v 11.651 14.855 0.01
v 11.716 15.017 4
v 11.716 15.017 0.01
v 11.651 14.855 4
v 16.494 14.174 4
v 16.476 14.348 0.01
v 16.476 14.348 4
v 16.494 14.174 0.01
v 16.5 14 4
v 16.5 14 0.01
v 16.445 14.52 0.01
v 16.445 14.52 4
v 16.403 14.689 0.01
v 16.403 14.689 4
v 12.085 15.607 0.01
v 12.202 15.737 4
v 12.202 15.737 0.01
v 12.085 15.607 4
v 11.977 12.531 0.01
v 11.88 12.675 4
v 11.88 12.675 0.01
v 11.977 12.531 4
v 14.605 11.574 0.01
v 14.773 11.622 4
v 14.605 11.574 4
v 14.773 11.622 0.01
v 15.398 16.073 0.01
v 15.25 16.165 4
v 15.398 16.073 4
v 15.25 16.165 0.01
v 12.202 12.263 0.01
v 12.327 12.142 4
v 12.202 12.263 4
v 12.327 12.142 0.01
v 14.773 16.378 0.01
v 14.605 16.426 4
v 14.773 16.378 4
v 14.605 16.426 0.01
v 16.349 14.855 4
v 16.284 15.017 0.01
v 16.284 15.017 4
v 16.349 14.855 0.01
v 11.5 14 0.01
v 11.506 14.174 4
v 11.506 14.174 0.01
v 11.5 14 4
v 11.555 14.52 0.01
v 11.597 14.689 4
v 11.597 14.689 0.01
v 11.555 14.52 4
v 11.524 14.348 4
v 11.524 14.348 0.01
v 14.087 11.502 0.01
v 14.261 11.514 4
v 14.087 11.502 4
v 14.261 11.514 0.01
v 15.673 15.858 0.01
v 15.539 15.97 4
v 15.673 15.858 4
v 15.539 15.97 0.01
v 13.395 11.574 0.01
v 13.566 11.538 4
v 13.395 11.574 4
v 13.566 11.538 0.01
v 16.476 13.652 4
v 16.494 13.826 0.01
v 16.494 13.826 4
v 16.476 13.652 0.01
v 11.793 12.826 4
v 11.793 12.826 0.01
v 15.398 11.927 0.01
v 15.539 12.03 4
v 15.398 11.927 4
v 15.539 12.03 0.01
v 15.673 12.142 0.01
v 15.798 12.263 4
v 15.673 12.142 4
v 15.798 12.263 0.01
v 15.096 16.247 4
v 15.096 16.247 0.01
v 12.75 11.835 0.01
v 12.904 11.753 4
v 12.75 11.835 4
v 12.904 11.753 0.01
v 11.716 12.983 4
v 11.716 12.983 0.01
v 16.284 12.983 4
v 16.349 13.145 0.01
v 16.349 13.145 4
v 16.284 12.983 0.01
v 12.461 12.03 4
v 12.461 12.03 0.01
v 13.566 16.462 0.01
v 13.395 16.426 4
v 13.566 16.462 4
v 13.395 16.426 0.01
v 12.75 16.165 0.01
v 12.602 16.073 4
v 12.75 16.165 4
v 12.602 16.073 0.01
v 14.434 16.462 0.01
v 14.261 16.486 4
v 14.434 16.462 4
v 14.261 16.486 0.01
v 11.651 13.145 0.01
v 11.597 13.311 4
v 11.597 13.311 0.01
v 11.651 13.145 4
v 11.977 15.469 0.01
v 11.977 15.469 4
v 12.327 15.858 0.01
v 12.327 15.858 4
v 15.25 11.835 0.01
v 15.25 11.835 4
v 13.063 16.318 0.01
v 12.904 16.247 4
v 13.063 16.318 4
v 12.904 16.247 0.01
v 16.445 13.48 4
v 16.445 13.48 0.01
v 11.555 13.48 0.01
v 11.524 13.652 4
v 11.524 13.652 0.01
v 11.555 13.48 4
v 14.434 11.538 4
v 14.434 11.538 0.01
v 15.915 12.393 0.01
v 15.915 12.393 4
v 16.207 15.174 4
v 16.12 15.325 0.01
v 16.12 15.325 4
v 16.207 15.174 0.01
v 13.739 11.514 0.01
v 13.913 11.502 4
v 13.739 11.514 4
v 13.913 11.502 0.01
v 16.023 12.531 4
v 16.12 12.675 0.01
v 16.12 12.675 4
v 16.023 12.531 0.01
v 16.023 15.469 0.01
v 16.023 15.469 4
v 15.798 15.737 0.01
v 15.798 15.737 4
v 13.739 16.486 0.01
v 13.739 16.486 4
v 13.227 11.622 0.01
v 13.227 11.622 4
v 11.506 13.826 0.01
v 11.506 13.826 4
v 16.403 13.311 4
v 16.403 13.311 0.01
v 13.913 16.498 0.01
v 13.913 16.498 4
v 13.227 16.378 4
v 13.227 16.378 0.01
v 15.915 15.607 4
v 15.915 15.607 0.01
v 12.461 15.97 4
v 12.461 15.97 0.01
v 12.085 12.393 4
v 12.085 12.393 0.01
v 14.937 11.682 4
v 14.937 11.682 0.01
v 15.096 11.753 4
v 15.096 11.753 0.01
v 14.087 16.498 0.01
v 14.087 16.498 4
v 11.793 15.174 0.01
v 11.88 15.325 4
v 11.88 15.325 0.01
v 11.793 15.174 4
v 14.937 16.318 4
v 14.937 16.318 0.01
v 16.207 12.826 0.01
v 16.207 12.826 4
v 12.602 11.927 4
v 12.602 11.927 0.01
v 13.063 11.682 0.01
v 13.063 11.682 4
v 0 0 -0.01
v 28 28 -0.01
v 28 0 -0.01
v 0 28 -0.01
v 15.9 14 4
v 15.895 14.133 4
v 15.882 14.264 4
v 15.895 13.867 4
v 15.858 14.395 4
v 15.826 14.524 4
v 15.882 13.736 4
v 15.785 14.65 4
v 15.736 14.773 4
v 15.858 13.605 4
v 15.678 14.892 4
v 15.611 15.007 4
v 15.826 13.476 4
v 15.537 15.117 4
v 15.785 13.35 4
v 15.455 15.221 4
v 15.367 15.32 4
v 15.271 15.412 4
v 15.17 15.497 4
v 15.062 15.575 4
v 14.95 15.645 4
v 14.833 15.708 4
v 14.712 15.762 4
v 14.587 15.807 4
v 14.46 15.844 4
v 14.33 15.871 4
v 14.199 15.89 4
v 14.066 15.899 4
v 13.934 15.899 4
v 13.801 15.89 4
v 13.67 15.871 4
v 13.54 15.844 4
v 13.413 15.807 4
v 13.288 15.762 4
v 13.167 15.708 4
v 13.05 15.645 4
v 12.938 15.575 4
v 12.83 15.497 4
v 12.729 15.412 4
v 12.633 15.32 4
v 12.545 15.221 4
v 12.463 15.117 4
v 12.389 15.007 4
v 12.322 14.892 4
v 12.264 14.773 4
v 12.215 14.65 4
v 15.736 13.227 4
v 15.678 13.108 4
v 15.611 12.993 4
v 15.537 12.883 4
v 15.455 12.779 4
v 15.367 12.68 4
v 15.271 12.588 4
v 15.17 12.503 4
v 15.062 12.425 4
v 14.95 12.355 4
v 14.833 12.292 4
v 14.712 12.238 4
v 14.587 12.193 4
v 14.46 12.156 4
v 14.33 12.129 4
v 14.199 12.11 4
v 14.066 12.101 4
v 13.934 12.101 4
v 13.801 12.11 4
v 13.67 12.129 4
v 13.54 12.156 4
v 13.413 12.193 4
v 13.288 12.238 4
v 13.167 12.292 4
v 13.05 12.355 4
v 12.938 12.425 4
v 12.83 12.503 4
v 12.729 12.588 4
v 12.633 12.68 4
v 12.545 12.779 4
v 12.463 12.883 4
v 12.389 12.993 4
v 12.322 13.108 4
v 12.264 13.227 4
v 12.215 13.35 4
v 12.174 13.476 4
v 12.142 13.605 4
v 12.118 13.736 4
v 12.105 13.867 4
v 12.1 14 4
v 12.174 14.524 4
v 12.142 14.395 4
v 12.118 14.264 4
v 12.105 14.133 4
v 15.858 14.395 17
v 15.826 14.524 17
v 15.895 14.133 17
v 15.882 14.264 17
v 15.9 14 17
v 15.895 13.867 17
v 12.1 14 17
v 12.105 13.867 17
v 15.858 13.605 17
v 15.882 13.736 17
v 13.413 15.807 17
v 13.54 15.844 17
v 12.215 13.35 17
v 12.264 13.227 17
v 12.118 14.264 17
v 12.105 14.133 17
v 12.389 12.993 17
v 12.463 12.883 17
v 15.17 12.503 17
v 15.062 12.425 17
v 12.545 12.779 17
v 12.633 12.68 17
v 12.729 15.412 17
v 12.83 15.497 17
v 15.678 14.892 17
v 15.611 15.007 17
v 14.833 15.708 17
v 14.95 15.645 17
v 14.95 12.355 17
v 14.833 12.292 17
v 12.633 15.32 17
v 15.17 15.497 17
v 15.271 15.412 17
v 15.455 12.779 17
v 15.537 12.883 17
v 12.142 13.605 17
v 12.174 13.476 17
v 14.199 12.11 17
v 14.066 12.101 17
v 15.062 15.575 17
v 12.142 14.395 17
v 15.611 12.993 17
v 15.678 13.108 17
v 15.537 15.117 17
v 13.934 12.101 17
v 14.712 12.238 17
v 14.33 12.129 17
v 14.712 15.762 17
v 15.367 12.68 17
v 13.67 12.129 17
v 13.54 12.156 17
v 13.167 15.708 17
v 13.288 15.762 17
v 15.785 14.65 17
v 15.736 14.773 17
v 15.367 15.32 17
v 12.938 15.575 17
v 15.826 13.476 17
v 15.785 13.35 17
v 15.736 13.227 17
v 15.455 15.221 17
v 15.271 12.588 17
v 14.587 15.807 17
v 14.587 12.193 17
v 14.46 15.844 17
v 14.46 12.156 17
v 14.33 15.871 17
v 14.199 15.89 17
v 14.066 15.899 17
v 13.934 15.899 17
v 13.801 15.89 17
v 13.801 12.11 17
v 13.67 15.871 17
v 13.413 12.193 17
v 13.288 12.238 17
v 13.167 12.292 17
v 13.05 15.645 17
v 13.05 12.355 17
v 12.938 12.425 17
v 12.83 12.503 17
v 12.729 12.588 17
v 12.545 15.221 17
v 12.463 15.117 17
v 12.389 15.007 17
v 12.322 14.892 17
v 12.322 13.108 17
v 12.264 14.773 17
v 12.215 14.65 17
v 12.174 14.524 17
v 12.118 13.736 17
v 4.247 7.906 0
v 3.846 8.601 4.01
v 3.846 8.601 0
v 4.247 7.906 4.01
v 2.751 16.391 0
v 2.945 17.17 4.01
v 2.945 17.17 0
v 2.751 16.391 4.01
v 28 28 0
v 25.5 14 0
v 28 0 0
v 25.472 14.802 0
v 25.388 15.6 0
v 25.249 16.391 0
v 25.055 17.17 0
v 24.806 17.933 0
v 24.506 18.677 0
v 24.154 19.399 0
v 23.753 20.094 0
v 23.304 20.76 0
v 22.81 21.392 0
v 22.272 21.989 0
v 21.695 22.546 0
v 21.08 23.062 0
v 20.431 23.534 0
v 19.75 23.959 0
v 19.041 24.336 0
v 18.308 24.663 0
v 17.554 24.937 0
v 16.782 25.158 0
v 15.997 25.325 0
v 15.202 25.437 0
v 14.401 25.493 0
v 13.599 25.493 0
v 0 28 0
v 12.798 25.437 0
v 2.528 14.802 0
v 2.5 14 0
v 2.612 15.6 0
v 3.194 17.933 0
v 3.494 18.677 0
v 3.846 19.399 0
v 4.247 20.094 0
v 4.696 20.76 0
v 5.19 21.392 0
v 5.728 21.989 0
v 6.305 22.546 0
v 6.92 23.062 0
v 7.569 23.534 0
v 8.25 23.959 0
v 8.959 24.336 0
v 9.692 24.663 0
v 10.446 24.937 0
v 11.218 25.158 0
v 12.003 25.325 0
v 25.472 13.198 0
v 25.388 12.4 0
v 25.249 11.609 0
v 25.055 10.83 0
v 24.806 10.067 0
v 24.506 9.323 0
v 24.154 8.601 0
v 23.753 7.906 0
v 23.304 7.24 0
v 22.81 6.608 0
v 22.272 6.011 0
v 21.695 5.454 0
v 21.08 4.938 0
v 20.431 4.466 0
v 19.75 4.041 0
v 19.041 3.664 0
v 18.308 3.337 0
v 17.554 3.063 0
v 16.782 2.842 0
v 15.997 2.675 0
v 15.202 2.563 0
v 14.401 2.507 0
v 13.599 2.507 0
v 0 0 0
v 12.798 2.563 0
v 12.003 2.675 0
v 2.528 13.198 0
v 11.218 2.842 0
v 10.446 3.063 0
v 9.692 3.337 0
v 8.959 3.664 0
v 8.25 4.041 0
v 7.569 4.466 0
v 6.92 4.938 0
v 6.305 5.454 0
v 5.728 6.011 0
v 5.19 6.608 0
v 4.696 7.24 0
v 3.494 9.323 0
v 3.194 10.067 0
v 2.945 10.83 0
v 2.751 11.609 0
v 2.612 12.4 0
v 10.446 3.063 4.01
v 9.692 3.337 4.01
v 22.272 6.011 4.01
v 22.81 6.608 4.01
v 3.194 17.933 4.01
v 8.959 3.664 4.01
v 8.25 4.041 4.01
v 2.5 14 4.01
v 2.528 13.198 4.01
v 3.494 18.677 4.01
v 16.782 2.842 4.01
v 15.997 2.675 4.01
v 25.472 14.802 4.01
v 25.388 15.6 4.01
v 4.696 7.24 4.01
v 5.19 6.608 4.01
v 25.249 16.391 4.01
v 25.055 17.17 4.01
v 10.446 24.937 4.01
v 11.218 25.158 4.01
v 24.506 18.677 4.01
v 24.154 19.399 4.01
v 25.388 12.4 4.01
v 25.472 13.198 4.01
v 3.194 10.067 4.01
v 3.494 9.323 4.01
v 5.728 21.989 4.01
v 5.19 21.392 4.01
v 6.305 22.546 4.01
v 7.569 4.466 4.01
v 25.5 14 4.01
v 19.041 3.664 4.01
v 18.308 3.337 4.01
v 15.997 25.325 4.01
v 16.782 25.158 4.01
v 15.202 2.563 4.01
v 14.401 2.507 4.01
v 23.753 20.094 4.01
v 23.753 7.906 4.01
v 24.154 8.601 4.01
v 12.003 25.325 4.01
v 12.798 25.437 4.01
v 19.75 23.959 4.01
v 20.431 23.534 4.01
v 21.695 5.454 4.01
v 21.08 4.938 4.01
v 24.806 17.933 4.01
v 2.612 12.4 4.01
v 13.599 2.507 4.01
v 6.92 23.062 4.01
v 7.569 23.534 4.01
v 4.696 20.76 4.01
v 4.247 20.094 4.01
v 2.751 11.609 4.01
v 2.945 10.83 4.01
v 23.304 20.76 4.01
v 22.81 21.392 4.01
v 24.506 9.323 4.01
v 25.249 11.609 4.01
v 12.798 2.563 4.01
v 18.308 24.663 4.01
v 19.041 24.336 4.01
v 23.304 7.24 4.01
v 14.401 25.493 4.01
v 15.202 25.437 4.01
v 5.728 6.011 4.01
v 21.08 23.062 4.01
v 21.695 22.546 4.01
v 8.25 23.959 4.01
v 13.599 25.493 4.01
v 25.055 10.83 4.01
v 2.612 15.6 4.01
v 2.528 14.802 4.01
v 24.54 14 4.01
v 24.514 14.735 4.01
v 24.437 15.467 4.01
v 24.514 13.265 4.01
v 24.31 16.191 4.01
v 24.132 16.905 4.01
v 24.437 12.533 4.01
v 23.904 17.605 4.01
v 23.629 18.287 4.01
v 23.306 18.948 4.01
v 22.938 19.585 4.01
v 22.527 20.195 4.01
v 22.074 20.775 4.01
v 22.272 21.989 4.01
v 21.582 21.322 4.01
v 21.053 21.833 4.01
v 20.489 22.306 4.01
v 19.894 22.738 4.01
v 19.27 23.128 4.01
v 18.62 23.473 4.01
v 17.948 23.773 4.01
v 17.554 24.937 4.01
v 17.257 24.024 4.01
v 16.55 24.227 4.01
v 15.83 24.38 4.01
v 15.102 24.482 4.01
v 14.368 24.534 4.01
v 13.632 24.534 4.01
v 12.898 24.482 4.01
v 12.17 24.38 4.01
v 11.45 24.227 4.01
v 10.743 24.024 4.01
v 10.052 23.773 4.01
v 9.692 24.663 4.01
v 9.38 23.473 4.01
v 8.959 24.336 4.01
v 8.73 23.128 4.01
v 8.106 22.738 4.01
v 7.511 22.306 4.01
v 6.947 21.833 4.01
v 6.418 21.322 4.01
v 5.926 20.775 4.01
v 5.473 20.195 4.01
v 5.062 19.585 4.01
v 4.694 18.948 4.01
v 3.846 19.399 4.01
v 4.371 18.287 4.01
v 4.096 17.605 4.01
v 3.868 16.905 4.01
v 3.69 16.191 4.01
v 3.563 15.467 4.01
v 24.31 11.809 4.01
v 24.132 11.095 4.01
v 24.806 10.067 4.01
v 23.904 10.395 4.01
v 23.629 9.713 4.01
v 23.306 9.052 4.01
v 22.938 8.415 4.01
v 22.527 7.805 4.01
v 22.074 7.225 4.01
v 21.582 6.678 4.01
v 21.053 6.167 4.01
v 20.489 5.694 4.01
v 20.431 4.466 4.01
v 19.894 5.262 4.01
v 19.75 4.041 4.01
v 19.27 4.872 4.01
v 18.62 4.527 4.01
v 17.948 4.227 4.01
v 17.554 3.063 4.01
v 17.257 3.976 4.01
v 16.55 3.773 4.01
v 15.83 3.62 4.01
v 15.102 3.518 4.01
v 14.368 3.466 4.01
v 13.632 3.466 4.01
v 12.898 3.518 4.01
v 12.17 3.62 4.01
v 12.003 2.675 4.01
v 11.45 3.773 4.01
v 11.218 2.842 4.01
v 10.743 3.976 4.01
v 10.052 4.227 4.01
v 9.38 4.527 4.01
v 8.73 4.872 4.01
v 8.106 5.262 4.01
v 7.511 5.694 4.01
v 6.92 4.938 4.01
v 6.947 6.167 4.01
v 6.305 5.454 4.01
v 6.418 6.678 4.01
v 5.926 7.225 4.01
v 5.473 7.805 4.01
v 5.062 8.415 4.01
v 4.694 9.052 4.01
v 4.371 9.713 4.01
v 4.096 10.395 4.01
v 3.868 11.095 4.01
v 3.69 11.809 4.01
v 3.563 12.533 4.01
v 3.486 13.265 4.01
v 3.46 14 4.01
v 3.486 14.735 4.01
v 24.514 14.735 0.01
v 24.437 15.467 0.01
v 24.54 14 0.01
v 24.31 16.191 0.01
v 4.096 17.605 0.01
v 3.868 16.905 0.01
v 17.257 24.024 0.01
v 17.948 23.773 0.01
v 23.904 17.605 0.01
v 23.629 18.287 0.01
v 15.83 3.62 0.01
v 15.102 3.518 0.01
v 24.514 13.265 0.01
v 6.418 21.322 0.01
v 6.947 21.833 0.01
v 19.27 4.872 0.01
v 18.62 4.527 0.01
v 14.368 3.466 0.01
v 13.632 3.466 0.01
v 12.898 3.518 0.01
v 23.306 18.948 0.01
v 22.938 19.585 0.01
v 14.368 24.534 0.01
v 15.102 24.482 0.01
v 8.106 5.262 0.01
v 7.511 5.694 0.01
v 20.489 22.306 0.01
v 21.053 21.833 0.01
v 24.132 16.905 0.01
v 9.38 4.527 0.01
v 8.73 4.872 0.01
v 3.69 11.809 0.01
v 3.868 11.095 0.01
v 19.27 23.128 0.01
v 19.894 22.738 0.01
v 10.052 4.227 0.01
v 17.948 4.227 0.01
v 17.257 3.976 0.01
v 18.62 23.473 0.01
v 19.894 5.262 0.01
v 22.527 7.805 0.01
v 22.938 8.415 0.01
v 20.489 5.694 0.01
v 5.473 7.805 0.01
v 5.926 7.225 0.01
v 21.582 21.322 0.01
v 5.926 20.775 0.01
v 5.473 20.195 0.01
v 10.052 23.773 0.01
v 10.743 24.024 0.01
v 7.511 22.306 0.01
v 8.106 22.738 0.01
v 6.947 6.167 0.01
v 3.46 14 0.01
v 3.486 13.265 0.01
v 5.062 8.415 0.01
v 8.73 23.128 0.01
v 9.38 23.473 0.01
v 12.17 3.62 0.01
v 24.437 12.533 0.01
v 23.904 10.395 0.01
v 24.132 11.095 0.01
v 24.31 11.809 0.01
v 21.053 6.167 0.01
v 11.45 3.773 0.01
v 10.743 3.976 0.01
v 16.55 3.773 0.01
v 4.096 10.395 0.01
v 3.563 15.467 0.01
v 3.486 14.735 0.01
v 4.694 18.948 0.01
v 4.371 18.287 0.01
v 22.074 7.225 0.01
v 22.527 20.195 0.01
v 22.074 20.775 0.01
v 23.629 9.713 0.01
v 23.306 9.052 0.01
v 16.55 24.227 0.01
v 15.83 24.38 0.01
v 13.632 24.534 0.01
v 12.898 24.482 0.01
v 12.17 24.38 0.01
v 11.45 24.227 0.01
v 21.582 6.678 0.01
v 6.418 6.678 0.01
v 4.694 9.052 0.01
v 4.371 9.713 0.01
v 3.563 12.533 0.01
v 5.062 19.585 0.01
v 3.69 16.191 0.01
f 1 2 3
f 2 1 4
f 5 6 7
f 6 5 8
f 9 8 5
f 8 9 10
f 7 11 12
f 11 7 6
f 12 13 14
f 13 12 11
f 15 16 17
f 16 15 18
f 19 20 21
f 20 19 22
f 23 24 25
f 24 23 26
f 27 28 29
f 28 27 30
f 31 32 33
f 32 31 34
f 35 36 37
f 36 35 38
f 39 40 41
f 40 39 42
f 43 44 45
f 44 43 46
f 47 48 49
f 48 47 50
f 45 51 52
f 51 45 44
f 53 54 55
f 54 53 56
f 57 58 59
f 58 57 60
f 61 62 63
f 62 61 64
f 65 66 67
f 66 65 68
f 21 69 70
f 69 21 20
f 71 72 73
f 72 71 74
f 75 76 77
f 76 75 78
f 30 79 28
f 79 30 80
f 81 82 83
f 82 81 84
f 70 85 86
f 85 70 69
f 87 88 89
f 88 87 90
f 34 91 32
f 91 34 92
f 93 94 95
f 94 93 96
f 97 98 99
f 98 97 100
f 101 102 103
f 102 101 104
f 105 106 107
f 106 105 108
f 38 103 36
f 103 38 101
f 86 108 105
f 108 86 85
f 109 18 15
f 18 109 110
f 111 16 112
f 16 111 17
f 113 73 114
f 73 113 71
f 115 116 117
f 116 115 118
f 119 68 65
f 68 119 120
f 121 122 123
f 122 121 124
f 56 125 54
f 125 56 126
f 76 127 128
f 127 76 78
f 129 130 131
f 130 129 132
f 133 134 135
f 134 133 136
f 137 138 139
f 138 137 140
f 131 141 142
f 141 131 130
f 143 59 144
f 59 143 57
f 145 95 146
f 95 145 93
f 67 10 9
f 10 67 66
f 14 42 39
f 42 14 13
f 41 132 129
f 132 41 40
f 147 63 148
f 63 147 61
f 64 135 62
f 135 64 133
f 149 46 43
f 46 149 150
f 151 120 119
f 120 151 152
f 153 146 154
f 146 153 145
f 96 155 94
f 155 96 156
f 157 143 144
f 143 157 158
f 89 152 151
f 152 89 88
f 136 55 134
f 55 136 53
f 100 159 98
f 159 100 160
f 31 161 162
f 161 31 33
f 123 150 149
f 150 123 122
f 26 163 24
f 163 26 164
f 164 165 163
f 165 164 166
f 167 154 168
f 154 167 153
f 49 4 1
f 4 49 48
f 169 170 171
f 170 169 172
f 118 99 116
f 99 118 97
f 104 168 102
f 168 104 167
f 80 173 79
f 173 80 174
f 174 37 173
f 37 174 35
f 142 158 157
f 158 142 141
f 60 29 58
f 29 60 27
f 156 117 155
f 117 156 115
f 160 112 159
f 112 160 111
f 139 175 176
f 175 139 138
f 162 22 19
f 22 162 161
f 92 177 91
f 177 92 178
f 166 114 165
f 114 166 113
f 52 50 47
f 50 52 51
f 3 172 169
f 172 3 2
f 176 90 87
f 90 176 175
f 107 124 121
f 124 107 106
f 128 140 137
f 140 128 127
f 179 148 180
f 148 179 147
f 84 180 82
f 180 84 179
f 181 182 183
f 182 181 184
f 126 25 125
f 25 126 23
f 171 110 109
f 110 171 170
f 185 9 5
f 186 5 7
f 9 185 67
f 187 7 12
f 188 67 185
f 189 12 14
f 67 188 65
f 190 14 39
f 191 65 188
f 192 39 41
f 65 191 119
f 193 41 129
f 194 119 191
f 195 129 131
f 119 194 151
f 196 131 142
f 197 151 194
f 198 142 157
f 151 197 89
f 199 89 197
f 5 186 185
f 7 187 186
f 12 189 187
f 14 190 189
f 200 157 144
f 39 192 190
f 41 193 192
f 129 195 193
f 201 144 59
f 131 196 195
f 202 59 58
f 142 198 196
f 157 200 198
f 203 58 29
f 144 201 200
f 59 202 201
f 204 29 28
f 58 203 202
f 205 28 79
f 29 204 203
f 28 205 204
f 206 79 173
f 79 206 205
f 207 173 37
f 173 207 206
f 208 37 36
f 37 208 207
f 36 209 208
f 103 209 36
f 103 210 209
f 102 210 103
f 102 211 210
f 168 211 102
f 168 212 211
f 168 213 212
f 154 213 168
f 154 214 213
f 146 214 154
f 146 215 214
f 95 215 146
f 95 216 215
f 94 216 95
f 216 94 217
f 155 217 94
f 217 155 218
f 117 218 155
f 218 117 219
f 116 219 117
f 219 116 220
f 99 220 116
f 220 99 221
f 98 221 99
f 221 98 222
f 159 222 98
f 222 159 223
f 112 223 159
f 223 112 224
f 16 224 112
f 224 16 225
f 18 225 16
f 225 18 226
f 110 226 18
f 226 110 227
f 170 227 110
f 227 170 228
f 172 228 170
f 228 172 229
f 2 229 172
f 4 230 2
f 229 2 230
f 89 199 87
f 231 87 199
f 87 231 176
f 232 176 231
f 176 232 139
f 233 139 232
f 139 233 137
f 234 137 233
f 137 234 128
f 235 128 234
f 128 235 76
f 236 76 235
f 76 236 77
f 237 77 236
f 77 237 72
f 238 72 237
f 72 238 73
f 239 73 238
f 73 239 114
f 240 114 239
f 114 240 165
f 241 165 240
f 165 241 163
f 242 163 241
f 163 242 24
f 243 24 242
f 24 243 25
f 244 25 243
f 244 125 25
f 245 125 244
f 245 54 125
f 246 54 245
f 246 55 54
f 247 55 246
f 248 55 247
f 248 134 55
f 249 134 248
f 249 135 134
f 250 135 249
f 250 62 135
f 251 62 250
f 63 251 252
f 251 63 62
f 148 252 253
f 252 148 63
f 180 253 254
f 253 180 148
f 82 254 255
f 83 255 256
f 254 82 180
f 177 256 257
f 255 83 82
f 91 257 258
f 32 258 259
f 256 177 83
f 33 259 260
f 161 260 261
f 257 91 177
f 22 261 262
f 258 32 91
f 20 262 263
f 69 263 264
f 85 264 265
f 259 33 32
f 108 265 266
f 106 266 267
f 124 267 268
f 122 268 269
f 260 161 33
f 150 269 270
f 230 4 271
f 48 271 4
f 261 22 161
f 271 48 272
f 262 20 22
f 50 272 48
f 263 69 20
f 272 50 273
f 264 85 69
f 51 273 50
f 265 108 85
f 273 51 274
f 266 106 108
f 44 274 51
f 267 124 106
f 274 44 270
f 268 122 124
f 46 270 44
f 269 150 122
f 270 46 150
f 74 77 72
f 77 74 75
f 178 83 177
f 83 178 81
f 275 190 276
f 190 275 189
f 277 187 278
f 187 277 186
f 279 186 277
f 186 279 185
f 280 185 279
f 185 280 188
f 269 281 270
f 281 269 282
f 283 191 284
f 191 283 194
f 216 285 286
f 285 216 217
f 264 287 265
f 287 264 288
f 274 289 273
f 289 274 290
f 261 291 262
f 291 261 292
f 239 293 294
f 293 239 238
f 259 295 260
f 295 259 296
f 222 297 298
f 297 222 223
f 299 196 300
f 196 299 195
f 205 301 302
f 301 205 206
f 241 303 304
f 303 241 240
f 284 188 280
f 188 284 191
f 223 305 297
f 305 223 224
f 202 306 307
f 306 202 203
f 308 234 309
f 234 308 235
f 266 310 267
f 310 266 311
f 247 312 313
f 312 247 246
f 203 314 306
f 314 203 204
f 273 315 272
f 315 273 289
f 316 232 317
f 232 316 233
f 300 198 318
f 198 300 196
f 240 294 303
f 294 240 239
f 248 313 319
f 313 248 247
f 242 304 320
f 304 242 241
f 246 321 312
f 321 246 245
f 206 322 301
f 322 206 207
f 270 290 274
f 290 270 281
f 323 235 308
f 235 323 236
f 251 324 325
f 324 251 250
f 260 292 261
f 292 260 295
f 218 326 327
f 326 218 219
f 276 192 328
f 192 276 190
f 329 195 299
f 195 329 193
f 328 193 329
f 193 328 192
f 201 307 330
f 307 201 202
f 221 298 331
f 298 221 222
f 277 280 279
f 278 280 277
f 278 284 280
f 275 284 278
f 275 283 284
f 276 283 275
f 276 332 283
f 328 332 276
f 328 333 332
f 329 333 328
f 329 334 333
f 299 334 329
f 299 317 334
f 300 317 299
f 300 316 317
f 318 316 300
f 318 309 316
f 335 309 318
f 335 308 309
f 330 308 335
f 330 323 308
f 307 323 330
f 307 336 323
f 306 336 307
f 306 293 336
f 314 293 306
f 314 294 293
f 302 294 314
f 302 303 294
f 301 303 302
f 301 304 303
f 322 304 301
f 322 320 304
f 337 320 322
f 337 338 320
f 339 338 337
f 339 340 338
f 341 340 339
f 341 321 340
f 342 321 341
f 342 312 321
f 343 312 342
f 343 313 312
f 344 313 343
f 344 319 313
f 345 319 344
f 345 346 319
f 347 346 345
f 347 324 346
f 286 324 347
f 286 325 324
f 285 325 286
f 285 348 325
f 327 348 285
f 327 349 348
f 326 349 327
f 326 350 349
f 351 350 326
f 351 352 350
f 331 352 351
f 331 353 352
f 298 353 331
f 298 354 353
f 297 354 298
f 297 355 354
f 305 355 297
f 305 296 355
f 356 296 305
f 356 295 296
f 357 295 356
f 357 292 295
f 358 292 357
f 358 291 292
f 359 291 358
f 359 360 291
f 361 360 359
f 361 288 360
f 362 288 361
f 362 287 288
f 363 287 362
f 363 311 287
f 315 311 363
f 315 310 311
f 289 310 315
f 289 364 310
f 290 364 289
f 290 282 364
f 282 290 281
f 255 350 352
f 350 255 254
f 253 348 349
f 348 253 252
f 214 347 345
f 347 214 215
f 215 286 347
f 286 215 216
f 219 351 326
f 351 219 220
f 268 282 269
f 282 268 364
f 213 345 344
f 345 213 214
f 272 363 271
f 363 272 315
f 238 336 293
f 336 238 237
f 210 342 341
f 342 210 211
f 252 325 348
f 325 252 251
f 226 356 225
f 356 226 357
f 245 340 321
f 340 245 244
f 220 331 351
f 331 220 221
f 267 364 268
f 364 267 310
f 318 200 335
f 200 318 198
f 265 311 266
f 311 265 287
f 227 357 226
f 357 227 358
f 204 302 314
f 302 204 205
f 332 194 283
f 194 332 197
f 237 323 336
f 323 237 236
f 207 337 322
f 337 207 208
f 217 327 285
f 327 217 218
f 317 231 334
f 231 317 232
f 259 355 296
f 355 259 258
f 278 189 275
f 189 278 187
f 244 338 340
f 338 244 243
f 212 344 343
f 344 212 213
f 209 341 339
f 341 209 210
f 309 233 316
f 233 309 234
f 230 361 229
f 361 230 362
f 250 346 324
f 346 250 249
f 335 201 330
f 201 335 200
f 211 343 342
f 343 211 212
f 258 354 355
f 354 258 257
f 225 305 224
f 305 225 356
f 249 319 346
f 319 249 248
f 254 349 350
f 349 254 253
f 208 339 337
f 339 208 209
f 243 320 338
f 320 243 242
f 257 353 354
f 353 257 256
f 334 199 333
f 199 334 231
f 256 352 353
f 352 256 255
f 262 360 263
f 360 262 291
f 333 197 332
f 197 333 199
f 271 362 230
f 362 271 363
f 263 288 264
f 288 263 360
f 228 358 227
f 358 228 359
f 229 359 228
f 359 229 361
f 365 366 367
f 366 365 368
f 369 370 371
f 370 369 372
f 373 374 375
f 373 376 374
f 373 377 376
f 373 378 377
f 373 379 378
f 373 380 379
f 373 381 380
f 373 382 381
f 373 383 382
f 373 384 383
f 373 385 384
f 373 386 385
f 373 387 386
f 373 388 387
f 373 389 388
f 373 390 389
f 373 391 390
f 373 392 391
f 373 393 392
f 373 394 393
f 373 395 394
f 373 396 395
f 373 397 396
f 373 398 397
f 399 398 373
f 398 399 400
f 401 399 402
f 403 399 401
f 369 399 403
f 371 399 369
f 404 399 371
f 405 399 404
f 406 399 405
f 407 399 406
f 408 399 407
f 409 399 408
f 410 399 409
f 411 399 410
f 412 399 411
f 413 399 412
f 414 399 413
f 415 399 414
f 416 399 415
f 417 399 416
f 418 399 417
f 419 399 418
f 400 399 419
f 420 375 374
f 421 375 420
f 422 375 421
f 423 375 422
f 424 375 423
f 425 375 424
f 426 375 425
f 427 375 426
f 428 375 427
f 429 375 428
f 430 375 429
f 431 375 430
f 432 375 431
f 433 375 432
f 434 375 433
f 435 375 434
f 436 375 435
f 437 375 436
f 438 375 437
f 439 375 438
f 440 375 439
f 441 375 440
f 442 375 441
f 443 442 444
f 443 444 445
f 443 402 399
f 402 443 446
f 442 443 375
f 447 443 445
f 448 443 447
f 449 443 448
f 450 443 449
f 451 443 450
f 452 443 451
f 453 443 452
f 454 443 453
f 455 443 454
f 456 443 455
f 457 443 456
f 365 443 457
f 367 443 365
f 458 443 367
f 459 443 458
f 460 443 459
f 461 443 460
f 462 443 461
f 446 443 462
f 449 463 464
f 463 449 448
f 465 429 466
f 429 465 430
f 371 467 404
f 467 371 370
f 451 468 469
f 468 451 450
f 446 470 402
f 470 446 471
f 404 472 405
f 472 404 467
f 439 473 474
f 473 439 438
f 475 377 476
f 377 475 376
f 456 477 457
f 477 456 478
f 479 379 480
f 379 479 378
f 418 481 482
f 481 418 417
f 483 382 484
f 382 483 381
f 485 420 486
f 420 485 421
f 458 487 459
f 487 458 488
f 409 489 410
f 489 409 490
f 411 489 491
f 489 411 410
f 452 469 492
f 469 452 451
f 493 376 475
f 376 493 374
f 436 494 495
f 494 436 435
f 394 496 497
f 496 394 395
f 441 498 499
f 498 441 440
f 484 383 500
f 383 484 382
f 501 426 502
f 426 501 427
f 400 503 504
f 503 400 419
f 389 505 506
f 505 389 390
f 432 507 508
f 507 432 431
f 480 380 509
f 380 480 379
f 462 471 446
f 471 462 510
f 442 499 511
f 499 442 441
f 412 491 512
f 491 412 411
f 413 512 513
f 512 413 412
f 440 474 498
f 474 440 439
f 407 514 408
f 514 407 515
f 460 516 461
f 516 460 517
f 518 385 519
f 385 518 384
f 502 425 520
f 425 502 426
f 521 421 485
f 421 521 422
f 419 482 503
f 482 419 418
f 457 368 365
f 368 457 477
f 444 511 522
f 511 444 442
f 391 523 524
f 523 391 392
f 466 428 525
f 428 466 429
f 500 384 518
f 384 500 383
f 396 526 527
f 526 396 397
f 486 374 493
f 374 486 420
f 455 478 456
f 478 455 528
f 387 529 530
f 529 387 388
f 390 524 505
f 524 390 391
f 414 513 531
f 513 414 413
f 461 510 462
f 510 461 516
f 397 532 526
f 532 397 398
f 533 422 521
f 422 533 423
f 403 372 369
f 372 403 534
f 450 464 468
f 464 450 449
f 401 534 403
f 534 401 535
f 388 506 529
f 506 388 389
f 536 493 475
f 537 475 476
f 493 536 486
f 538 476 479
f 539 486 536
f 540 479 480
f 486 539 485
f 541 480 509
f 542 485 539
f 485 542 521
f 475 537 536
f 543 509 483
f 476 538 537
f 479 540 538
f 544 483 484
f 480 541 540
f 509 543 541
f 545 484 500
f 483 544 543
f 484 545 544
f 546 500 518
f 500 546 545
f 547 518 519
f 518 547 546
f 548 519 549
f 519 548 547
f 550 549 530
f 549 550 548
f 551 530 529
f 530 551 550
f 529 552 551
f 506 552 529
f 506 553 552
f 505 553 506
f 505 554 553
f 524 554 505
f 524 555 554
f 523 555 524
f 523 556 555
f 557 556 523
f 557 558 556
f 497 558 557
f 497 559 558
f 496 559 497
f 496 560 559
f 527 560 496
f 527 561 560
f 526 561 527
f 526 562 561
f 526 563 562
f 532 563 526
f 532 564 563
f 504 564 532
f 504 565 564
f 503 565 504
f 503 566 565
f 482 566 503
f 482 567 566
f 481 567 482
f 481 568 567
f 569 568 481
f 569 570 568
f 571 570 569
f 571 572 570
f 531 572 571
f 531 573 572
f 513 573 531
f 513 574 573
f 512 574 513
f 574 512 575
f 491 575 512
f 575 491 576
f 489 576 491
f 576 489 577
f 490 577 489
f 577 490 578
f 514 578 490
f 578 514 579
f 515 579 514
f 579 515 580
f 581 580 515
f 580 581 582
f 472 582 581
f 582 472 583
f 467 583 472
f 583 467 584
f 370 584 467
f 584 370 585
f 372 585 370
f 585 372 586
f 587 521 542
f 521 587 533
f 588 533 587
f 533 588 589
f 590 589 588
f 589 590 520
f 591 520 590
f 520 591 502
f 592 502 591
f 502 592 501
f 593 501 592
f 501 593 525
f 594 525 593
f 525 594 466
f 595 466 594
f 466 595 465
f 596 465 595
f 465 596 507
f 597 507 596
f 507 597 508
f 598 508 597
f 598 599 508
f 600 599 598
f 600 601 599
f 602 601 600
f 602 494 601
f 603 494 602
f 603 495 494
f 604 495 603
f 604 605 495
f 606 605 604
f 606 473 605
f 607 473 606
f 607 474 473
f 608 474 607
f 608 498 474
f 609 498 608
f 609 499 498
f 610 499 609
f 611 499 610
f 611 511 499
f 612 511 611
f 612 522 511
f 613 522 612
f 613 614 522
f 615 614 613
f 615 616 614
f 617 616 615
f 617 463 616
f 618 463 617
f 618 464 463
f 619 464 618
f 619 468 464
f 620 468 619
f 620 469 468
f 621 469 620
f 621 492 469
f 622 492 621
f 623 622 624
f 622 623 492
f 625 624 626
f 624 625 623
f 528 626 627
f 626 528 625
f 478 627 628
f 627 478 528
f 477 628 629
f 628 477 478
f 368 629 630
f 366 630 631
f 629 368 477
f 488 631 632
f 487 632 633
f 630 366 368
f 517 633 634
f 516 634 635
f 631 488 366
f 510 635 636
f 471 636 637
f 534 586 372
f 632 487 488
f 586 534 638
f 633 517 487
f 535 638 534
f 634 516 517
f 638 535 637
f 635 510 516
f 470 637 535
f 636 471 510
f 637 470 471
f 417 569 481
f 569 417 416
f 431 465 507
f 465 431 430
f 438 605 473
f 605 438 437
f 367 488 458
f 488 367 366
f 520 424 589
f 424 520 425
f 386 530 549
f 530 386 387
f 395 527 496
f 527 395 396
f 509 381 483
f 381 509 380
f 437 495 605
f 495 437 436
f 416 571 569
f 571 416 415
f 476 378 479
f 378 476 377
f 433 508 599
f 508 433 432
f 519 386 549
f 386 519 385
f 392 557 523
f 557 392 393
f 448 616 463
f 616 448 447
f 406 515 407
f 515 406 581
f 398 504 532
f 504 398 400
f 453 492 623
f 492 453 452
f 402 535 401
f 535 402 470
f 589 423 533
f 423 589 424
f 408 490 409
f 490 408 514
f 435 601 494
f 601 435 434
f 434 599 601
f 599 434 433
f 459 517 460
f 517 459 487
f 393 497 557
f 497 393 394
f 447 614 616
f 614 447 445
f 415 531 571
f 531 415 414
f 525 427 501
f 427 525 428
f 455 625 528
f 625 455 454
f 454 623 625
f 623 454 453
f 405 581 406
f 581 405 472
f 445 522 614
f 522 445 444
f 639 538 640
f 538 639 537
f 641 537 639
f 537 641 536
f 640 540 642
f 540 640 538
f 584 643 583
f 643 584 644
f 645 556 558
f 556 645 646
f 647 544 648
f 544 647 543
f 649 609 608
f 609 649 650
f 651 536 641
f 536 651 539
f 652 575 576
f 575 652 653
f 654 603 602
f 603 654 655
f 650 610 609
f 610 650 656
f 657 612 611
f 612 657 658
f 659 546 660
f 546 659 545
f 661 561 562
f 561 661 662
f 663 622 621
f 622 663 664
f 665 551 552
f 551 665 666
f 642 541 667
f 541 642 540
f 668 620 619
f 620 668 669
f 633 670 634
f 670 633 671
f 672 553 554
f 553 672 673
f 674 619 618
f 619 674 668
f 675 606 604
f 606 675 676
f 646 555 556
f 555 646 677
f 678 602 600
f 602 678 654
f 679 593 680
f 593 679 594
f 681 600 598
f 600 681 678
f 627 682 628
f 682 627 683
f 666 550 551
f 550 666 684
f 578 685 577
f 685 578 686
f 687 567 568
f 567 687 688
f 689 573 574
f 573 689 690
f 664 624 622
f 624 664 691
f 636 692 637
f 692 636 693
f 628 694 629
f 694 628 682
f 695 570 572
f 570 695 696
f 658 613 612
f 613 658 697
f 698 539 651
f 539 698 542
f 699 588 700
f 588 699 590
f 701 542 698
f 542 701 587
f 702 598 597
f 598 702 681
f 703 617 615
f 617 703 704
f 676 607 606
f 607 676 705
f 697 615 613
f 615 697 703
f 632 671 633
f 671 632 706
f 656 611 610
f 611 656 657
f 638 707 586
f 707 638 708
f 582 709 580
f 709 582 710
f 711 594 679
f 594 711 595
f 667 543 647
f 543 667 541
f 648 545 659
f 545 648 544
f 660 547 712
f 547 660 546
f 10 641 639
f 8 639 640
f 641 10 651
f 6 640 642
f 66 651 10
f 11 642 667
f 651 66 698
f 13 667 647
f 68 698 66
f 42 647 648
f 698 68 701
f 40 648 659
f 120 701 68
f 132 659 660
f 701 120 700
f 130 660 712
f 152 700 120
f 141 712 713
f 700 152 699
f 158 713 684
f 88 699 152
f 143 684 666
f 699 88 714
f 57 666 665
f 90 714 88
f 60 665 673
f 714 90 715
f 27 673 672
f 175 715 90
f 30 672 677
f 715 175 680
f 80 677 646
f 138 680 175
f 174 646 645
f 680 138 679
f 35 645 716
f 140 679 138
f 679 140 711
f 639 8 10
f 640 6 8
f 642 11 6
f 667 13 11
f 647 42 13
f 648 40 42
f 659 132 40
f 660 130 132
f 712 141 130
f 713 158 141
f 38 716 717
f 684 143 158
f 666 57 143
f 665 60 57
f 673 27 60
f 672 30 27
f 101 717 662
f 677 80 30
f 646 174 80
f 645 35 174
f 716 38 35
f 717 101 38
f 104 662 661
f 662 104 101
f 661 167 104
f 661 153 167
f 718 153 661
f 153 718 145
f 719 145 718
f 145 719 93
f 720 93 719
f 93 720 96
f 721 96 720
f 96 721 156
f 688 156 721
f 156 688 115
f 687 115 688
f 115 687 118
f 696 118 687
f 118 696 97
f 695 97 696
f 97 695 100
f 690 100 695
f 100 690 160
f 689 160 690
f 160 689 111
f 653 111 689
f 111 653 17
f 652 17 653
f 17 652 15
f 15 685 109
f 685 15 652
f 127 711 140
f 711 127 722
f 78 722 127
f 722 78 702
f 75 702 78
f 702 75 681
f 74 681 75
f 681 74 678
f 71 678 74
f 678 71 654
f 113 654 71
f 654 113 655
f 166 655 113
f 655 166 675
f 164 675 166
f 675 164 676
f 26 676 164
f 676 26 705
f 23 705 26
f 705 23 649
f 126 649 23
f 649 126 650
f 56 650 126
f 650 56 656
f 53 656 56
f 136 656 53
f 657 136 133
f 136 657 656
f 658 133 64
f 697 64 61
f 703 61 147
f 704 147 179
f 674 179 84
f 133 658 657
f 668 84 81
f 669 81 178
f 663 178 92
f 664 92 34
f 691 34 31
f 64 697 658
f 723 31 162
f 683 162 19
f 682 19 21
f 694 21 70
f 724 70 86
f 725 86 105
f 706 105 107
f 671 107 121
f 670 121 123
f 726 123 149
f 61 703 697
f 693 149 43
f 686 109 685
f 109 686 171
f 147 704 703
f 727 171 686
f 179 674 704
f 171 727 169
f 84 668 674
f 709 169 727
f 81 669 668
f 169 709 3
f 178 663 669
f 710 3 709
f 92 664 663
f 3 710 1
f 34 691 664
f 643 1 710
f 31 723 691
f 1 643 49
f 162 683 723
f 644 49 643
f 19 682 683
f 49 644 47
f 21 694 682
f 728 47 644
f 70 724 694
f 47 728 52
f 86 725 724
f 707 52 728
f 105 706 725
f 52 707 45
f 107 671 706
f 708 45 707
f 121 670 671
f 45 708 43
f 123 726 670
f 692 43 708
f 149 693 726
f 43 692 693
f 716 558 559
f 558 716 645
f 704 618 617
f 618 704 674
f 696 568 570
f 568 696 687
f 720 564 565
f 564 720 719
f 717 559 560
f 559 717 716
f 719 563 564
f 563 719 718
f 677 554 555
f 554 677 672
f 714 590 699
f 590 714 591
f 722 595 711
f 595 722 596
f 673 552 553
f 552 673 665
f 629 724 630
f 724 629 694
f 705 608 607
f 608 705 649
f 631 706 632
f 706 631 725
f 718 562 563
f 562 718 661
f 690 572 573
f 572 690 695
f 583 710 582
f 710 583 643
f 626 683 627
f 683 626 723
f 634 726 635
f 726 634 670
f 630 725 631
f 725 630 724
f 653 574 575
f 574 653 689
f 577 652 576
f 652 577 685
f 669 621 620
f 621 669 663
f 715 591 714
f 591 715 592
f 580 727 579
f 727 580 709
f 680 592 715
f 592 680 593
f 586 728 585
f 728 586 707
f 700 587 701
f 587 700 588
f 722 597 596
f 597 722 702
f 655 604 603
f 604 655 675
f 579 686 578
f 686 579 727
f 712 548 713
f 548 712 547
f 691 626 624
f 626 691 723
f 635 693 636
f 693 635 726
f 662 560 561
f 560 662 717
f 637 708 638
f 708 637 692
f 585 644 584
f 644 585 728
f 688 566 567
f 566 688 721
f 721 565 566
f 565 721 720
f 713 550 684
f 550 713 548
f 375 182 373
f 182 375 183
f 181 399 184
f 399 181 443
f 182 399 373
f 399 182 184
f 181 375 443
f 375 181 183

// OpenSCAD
// file: ../Base/PlacementOptions.scad
// Fischertechnik Box Foundation
// Placement Options

// Alignment
NoAlign = 0;
AlignLeft = 1;
AlignBottom = 2;
AlignCenter = 3;
AlignRight = 4;
AlignTop = 5;

// Element rotation degree steps
rotations = [0, -90, -180, -270];

// Rotation
NoRotation = 0;
Rotate0 = 0;
Rotate90 = 1;
Rotate180 = 2;
Rotate270 = 3;

// Docking (seen from above)
NoDock = -1;
DockLeft = 0;
DockTop = 1;
DockRight = 2;
DockCorner = 2;
DockBottom = 3;

// Web corners
LowerLeft = 0;
UpperLeft = 1;
UpperRight = 2;
LowerRight = 3;

// Web position relative to corner
LeftOfCorner = 0;
RightOfCorner = 1;
// file: ../Base/Boxes.scad
// Fischertechnik Box Foundation
// Pre-designed Boxes

use <Constants.scad>

include <PlacementOptions.scad>

box190Width = 190;
box190Depth = 130;
box130Width = 130;
box130Depth = 95;

// Values are from an original ec3 box
topBottomDifference = 1.5;
outerHeight = 40;
baseThickness = 1.8;
innerHeight = outerHeight - baseThickness;
stackExcess = 5.7;
radius = 3.5;
wallThickness = 1.5;
tolerance = 0.2;

boxWallThickness = wallThickness;
boxBaseThickness = baseThickness;
boxWebWidth = 3.0;

// getBoxWallThickness()
// Gets the wall thickness of a Fischertechnik Box
function getBoxWallThickness() = boxWallThickness;

// getBoxUsageHeight(height = 38.2)
// Gets the usable height of a Fischertechnik box
// height = Outer height of the box from the bottom to the upper edge.
function getBoxUsageHeight(height = outerHeight) = height - baseThickness - stackExcess;

// getBoxInnerHeight()
// Gets the inner height of a Fischertechnik box, including the stack excess
function getBoxInnerHeight() = innerHeight;

// getBoxBaseThickness()
// Gets the thickness of the Fischertechnik box base.
function getBoxBaseThickness() = boxBaseThickness;

// getBoxWebWidth()
// Gets the width of a box web
function getBoxWebWidth() = boxWebWidth;

// getBox190Space()
// Gets the usable inner space of a Box 190 as an x/y-list
function getBox190Space() = [
    box190Width - 2*getBoxWallThickness() - topBottomDifference, 
    box190Depth - 2*getBoxWallThickness() - topBottomDifference ];

// RoundedCornerPlate(width, depth, height, radius)
// Creates a body plate with rounded corners for a box. Used
// also to create the complete box with the hull module.
// width = Width of the plate
// depth = depth of the plate 
// height = thickness of the plate
// radius = radius of the rounded corner
module RoundedCornerPlate(width, depth, height, radius) {
    translate([radius, radius])
    hull() {
        w = width-2*radius;
        d = depth-2*radius;
        cube([w, d, height]);
        cylinder(height, r=radius, $fn=getFragments());
        translate([w, 0])
            cylinder(height, r=radius, $fn=getFragments());
        translate([w, d])
            cylinder(height, r=radius, $fn=getFragments());
        translate([0, d])
            cylinder(height, r=radius, $fn=getFragments());
    }
}

// BoxBase(width, depth)
// Creates an empty stackable Fischertechnik compatible box
// width = Outer width of the box (190, 130, ...)
// depth = Outer depth of the box (130, 95, ...)

module BoxBase(width, depth, height=outerHeight) {    
    thinPlate = 0.01;

    innerHeight = height - baseThickness;    
    
    module Body(tolerance=tolerance) {
        hull() {
            // Bottom with tolerance to fit into the original boxes when stacked
            translate([-wallThickness+tolerance, -wallThickness+tolerance, -baseThickness])
                RoundedCornerPlate(width-topBottomDifference-2*tolerance, depth-topBottomDifference-2*tolerance, thinPlate, radius);
            
            // Top
            translate([-wallThickness-topBottomDifference/2, -wallThickness-topBottomDifference/2, innerHeight-thinPlate])
                RoundedCornerPlate(width, depth, thinPlate, radius);
         }
    }

    module Cutoff() {
        hull() {
            coWidth = width - 2*wallThickness;
            coDepth = depth - 2*wallThickness;
            
            // Bottom
            RoundedCornerPlate(coWidth-topBottomDifference, coDepth-topBottomDifference, thinPlate, radius);

            // Top
            translate([-topBottomDifference/2, -topBottomDifference/2, innerHeight+thinPlate]) 
                RoundedCornerPlate(coWidth, coDepth, thinPlate, radius);
        }
    }
    
    difference() {        
        Body();
        Cutoff();
        stackOffset = innerHeight - stackExcess;
        translate([0, 0, stackOffset + baseThickness])
            Body(tolerance=0);
    }
}

// Creates the Fischertechnik empty box 130x190 mm and places it at position 0,0
// 190x130 are the outer sizes, the inner space is slightly smaller. Use getBox190Space() to get the inner sizes.
// The box is positioned that the usable inner space is at the 0,0,0 position.

module Box190() {
    BoxBase(box190Width, box190Depth);
}

// Gets the usable inner space of a Box 130 as an x/y-list
function getBox130Space() = [
    box130Width - 2*getBoxWallThickness() - topBottomDifference, 
    box130Depth - 2*getBoxWallThickness() - topBottomDifference ];

// Creates the Fischertechnik empty box 95x130 mm and places it at position 0,0
// 190x130 are the outer sizes, the inner space is slightly smaller. Use getBox190Space() to get the inner sizes.
// The box is positioned that the usable inner space is at the 0,0,0 position.

module Box130() {
    BoxBase(box130Width, box130Depth);
}

// Creates a web at the specified box walls
// corner 0 = LowerLeft, 1 = UpperLeft, 2 = UpperRight, 3 = LowerRight
// side 0 = LeftOfCorner, 1 = RightOfCorner
// distance = Distance in mm from the corner
// boxSpace = inner width and depth of the box (default: Box 190)
// webWidth = length of the web (default is 3 mms)
// webThickness = thickness of the web (default is 1 mm)
// height = Height of the web (standard is getBoxUsageHeight())
// sink = How much of the web is sunk into the wall

module BoxWeb(
    corner, 
    side, 
    distance, 
    boxSpace=getBox190Space(), 
    webWidth=getBoxWebWidth(), 
    webThickness=1.0, 
    height=getBoxUsageHeight(),
    sink = getBoxWallThickness()/2) {
    width = (corner % 2 == 0) ? 
            (side == LeftOfCorner ? webWidth : webThickness) :
            (side == LeftOfCorner ? webThickness : webWidth);

    depth = (corner % 2 == 0) ? 
            (side == RightOfCorner ? webWidth : webThickness) :
            (side == RightOfCorner ? webThickness : webWidth);
    
    xDiff = corner == LowerLeft ? 
                (side == LeftOfCorner ? -sink : distance) :
            (corner == UpperLeft ?                
                (side == LeftOfCorner ? distance : -sink) :
            (corner == UpperRight ?
                (side == LeftOfCorner ? boxSpace.x-webWidth+sink : boxSpace.x-distance-webThickness) :
                (side == LeftOfCorner ? boxSpace.x-distance-webThickness: boxSpace.x-webWidth+sink)));

    yDiff = corner == LowerLeft ? 
                (side == RightOfCorner ? -sink : distance) :
            (corner == UpperLeft ?
                (side == RightOfCorner ? boxSpace.y-distance-webThickness : boxSpace.y-webWidth+sink) :
            (corner == UpperRight ?
                (side == RightOfCorner ? boxSpace.y-webWidth+sink : boxSpace.y-distance-webThickness) :
                (side == RightOfCorner ? distance : -sink)));
    
    translate([xDiff, yDiff, -getExcess()])
        cube([width, depth, height + 2*getExcess()]);
}
// file: ../Base/Rotation.scad
// Fischertechnik Box Foundation
// Geometry Helpers Rotation

include <PlacementOptions.scad>

// getRotatedSpace(space, rotation=NoRotation)
// Rotates the space dependent on the specified rotation

function getRotatedSpace(space, rotation=NoRotation) = [
    (rotation == Rotate90 || rotation == Rotate270) ? space.y : space.x,
    (rotation == Rotate90 || rotation == Rotate270) ? space.x : space.y
];

// Rotates the given space around the fixed left lower corner
// space = the space the children needs as width/depth list [width,depth]
// rotation = 0 Rotate0 degrees, 1 Rotate90 degrees, 2 Rotate180 degrees, 3 Rotate270 degrees (equivalent to -90)

module RotateFix(space, rotation=NoRotation) {
    dy = (rotation == Rotate0 || rotation == Rotate270) ? 0 :
        (rotation == Rotate90) ? space.x :
        space.y;
    dx = (rotation < Rotate180) ? 0 :
        (rotation == Rotate180) ? space.x :
        space.y;
    
    translate([dx, dy, 0])
        rotate([0, 0, rotations[rotation]])
            children();
}
// file: ../Base/Alignment.scad
// Fischertechnik Box Foundation
// Geometry Helpers Alignment

include <PlacementOptions.scad>

// getAlignedX(elementWidth, spaceWidth, align=AlignRight, offset=0)
// Gets the aligned X offset of an element with the given
// width in the given space.
// elementWidth = The width of the element to positon
// spaceWidth = The space where the element should be aligned
// align = 0 AlignLeft, 1 AlignCenter, 2 AlignRight
// offset = an optional offset from the aligned position. When
// aligned left or centered, then positive values are in X direction.
// When aligned right then positive values are in negative X direction.

function getAlignedX(elementWidth, spaceWidth, align=AlignRight, offset=0) =
    (align == AlignLeft) ?
        offset :
        ((align == AlignCenter) ?
        (spaceWidth - elementWidth)/2 + offset :
        spaceWidth - offset - elementWidth);

// getAlignedY(elementDepth, spaceDepth, align=AlignTop, offset=0)
// Gets the aligned Y offset of an element with the given
// depth in the given space.
// elementDepth = The depth of the element to positon
// spaceDepth = The space where the element should be aligned
// align = 0 AlignBottom, 1 AlignCenter, 2 AlignTop
// offset = an optional offset from the aligned position. When
// aligned bottom or centered, then positive values are in Y direction.
// When aligned top then positive values are in negative Y direction.

function getAlignedY(elementDepth, spaceDepth, align=AlignTop, offset=0) =
    (align == AlignBottom) ?
        offset :
        ((align == AlignCenter) ?
        (spaceDepth - elementDepth)/2 + offset :
        spaceDepth - offset - elementDepth);
// file: ../Base/Placement.scad
// Fischertechnik Box Foundation
// Geometry Helpers Placement

use <Constants.scad>
use <Alignment.scad>
use <Rotation.scad>
use <Boxes.scad>

include <PlacementOptions.scad>

// Place(x=0, y=0, elementSpace=[0,0], alignX=AlignLeft, alignY=AlignBottom, rotation=Rotate0, boxSpace=getBox190Space())
// Places the child at the specified position
// y = Y-Position. This is a relative position when an X aligment is specified.
// x = X-Position. This is a relative position when an Y aligment is specified.
// elementSpace = space of the element to be placed [x,y]
// alignX = -1=NoAlign, 0 AlignLeft, 1 AlignCenter, 3 AlignRight (elementSpace and boxSpace required!)
// alignY = -1=NoAlign, 2 AlignBottom, 1 AlignCenter, 4 AlignTop (elementSpace and boxSpace required!)
// rotation = 0 Rotate0 0 degrees, 1 Rotate90 90 degrees, 
// 2 Rotate180 180 degrees, 3 Rotate270 270 degrees (equivalent to -90)
// boxSpace = Inner space of the box where the placement occurs [x,y] - default is Box 190x130 inner space

module Place(x=0, y=0, elementSpace=[0,0], 
  alignX=AlignLeft, alignY=AlignBottom, 
  rotation=NoRotation, boxSpace=getBox190Space()) {

    module Position(x, y, space, rotation=Rotate0) {
        translate([x, y, 0])
            RotateFix(space, rotation)
                children();
    }

    space = getRotatedSpace(elementSpace, rotation);
    alignedX = getAlignedX(space.x, boxSpace.x, alignX, x);
    alignedY = getAlignedY(space.y, boxSpace.y, alignY, y);
    Position(alignedX, alignedY, elementSpace, rotation)
        children();
}

// Center(space=getBox130Space(), elementSpace=[0,0])
// space = Space where the children is centered. For cylinder use centered=true and no elementSpace.
// elementSpace = space of the element to be centered [x,y]

module Center(space=getBox190Space(), elementSpace=[0,0]) {
    Place(elementSpace=elementSpace, boxSpace=space, alignX=AlignCenter, alignY=AlignCenter)
        children();
}

// CenterHorizontal(width=0, y=0, offset=0, space=getBox130Space())
// width = Width of the element to be placed.
// y = Y position of the element
// offset = Offset from the center position (negative will be left of the center)
// space = Space where the element is placed

module CenterHorizontal(width=0, y=0, offset=0, space=getBox190Space()) {
    Place(x=offset, y=y, elementSpace=[width, 0], boxSpace=space, alignX=AlignCenter)
        children(0);
}

// CenterVertical(depth=0, x=0, offset=0, space=getBox130Space())
// depth = Depth of the element to be placed.
// x = X position of the element
// offset = Offset from the center position (negative will be down of the center)
// space = Space where the element is placed

module CenterVertical(depth=0, x=0, offset=0, space=getBox190Space()) {
    Place(x=x, y=offset, elementSpace=[0, depth], boxSpace=space, alignY=AlignCenter)
        children(0);
}

// getIsVertical(align)
// True if the specified alignment needs a vertical orientation for a divider (AlignRight, AlignLeft)

function getIsVertical(align) = (align == AlignRight || align == AlignLeft);

// getIsHorizontal(align)
// True if the specified alignment needs a horizontal orientation for a divider (AlignTop, AlignBottom)

function getIsHorizontal(align) = (align == AlignTop || align == AlignBottom);
// file: ../Base/Constants.scad
// Fischertechnik Box Foundation
// Constants

// Constant values necessary for multiple elements

// Base constants
dividerThickness = 1.2;
excess = 0.01;
fragments = 90;
tolerance = 0.8;

// Gets the thickness of a divider 
function getDividerThickness() = dividerThickness;

// Gets the excess that is used to merge walls into each other
function getExcess() = excess;

// Gets amount of fragments of a cylinder
function getFragments() = fragments;

// Gets the inner tolerance of a frame to each side
function getTolerance() = tolerance;


// Fischertechnik specific constants
axisDiameter = 4;
axisBottomDiameter = axisDiameter + 1;
axisTolerance = 0.2;

// Gets axis diameter of Fischertechnik axis
function getAxisDiameter() = axisDiameter;

// Gets axis diameter tolerance (subtracted for element axis)
function getAxisTolerance() = axisTolerance;

// Gets the axis diameter for standing axis
function getStandAxisDiameter() = getAxisDiameter() - getAxisTolerance();

// Gets axis bottom diameter for thicker part at the bottom
function getAxisBottomDiameter() = axisBottomDiameter;

pinHeight = 2.5;

// gets the height of a connecting pin
function getPinHeight() = pinHeight;

standardEdgeDistance = 2.5;
standardWebDistance = 11.5;
standardCornerLength = 15;

// gets the standard distance to the wall of the box for dockable frames with webs
function getStandardEdgeDistance() = standardEdgeDistance;

// gets the standard distance of each web to the corner of the dockable frame
function getStandardWebDistance() = standardWebDistance;

// gets the standard length of the corner walls of a dockable frame
function getStandardCornerLength() = standardCornerLength;

tubeWallFactor = 0.8;

// gets the wall thickness of a tube.
function getTubeWallThickness() = tubeWallFactor * getDividerThickness();

smallPartsFrameHeight = 20;

// gets the frame height for docked small parts boxes.
function getSmallPartsFrameHeight() = smallPartsFrameHeight;

hubRingDiameter = 19.5;
hubRingLevelDiameter = 21;

// gets the diameter of a tube matching the inner ring of a wheel
function getHubRingDiameter() = hubRingDiameter;

// gets the diameter of a hub tube with a thicker diameter
function getHubRingLevelDiameter() = hubRingLevelDiameter;
// main file
// Fischertechnik Box Library
// Cylinder and axis for hub 
// 31014

use <../Base/Constants.scad>
use <../Base/Placement.scad>
use <../ModelBase/Simple.scad>

/* [Hidden] */
width = 28;
depth = 28;

// getCylinderHub()
// Gets the space the cylinder for a hub needs as width and depth (.x and .y as a list)

function getCylinderHubSpace() = [width, depth];

// CylinderHub()
// Standing cylinder and axis for a hub.
// 31014

module CylinderHub() {
    diameter = 23;
    height = 4;
    axisHeight = 17;

    Space(getCylinderHubSpace());
        
    Center(getCylinderHubSpace()) {
        LeveledAxis(axisHeight, height);
        Tube(height, outerDiameter=diameter);
    }
}

// Tests
color("lightgray")
CylinderHub();
